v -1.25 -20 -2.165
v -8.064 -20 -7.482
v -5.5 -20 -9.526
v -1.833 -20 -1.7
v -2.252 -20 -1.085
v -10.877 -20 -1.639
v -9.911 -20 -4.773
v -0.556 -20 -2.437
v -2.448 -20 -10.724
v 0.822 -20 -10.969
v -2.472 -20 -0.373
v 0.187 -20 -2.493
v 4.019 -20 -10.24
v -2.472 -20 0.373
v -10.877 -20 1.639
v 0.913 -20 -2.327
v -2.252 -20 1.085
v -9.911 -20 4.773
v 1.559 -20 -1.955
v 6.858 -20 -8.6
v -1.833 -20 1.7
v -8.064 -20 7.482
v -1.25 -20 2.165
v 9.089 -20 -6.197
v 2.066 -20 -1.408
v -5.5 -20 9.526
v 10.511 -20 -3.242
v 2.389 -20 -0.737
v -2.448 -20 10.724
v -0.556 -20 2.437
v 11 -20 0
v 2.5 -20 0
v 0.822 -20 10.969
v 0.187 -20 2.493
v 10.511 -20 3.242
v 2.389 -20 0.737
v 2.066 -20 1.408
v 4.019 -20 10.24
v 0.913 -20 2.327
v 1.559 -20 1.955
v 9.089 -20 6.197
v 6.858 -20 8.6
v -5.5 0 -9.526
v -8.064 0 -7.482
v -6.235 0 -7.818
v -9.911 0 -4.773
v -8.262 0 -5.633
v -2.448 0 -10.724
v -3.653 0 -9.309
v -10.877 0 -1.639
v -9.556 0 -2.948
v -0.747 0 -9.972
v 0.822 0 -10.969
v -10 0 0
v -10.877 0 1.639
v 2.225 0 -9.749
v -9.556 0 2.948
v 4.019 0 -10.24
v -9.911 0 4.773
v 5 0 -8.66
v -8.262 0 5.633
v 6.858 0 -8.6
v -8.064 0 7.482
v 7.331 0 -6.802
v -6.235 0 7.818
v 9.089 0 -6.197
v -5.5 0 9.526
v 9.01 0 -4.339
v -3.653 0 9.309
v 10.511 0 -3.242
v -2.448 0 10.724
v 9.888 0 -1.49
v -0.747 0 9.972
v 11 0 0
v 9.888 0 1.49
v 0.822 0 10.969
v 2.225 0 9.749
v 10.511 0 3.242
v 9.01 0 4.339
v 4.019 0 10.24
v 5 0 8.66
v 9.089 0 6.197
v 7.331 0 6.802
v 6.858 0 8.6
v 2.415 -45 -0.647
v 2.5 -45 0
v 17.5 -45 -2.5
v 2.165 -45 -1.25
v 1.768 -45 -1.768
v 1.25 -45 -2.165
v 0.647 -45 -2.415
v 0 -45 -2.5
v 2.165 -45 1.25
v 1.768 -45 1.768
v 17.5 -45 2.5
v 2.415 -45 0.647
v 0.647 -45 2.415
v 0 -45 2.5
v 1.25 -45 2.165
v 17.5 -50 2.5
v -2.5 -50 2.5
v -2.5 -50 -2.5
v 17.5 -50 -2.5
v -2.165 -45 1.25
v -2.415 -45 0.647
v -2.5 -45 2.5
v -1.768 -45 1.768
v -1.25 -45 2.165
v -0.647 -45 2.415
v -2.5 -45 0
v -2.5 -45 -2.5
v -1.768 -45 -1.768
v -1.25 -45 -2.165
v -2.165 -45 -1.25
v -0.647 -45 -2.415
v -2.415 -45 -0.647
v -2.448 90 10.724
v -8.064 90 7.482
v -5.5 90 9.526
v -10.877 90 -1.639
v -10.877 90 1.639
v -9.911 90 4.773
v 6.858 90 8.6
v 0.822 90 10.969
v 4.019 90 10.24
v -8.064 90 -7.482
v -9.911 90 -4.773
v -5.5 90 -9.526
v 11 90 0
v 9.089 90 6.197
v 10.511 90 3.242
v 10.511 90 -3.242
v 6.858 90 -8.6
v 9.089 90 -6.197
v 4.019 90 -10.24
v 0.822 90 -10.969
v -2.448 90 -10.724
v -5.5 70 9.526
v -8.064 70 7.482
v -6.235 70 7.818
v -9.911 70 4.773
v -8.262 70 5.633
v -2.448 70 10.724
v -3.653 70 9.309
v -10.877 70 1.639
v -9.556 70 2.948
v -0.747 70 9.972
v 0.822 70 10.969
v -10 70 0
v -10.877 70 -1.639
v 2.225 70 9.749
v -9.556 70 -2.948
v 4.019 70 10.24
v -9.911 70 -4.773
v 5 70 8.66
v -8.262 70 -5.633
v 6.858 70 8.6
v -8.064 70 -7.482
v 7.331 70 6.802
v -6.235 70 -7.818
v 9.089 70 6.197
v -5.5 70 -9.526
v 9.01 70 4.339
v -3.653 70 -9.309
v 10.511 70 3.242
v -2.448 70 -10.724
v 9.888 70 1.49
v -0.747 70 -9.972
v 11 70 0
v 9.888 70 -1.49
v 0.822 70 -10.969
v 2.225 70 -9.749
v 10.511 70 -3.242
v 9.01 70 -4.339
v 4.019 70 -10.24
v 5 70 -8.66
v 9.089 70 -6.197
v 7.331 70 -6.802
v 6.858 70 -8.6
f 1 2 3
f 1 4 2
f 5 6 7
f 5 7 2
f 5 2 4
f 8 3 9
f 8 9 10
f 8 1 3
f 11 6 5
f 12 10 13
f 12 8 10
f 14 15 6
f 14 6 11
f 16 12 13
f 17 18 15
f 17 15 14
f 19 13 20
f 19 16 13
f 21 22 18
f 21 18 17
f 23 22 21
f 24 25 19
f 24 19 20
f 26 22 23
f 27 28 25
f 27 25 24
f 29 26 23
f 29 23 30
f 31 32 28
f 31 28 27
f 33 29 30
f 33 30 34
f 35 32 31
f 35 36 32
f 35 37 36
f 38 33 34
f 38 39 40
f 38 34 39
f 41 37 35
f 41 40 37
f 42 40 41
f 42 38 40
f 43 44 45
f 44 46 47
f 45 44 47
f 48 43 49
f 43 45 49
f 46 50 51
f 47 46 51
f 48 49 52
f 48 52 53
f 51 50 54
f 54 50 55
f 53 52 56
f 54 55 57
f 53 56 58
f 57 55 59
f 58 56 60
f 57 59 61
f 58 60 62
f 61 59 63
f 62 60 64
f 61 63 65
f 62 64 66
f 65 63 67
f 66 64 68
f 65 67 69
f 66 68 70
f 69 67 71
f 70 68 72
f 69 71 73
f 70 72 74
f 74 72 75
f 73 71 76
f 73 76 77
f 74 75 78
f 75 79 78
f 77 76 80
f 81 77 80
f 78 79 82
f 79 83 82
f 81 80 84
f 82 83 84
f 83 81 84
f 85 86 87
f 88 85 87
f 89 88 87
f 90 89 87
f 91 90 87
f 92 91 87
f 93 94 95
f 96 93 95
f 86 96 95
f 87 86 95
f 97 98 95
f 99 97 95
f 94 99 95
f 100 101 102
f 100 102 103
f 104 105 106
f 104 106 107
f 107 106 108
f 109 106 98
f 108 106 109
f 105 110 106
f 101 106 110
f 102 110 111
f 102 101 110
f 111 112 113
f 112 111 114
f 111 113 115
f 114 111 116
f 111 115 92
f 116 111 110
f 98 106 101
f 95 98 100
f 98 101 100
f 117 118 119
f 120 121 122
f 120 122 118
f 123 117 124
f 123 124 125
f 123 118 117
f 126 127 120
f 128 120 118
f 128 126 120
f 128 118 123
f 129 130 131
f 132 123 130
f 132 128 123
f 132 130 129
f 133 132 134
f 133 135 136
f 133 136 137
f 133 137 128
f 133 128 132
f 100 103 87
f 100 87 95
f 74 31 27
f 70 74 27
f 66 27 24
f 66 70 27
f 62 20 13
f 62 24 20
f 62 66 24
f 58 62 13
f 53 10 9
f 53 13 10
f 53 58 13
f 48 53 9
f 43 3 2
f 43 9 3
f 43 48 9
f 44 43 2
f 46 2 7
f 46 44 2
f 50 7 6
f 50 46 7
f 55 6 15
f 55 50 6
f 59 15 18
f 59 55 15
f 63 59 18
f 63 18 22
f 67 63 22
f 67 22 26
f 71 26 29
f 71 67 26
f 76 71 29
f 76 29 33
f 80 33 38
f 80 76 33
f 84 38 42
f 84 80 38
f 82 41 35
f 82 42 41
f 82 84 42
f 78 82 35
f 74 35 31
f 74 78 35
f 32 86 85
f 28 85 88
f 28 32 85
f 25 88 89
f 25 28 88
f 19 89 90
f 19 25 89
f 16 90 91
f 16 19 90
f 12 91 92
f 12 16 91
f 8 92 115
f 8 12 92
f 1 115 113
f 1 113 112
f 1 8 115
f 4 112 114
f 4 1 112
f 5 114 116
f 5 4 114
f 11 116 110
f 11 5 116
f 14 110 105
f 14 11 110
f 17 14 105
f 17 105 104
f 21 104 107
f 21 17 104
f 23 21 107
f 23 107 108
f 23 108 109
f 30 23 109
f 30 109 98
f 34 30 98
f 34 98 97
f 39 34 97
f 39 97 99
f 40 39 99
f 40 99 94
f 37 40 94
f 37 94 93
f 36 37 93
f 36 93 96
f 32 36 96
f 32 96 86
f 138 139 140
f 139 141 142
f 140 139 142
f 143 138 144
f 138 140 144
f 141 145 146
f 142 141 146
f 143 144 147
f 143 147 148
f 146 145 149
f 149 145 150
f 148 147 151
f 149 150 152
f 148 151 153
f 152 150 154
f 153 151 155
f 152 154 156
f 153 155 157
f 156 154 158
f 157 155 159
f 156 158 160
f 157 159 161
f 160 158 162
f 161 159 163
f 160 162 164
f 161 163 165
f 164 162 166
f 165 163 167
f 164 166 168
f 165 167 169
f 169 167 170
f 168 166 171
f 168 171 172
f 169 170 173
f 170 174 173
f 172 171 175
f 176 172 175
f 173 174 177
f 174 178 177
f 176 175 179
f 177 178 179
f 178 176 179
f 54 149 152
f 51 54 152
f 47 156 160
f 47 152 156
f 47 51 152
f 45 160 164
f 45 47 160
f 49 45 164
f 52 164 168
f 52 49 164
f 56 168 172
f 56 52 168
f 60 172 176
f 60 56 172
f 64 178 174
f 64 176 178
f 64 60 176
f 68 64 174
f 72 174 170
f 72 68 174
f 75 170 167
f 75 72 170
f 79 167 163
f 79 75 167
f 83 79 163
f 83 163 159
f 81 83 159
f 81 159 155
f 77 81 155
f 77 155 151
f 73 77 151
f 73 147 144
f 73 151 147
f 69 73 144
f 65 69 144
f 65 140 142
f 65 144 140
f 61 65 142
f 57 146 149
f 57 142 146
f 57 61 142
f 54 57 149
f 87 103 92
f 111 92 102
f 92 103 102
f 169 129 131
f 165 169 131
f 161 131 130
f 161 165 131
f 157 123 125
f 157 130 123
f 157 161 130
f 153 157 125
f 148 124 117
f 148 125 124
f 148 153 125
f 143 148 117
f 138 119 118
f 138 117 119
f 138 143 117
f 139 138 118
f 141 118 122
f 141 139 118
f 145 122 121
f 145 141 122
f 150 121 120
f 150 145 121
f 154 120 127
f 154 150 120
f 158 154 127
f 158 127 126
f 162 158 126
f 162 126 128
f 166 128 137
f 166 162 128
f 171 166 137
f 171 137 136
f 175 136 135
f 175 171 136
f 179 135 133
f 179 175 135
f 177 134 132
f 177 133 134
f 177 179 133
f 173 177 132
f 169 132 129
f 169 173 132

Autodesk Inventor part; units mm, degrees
ref_plane "YZ Plane" through (0, 0, 0) normal (1, 0, 0) x (0, 1, 0)
ref_plane "XZ Plane" through (0, 0, 0) normal (0, 1, 0) x (-1, 0, 0)
ref_plane "XY Plane" through (0, 0, 0) normal (0, 0, 1) x (1, 0, 0)
sketch "Эскиз1" plane through (0, 0, 0) normal (0, 1, 0) x (-1, 0, 0)
  circle A0 centre (0, 0) radius 10
  dimension "d0" = 20
extrude "Выдавливание1" add sketch "Эскиз1" along normal blind 70
thread "Резьба2" size "M20x1.5" class "6g" standard "ANSI Metric M Profile" full length
sketch "Эскиз2" plane through (0, 70, 0) normal (0, 1, 0) x (1, 0, 0)
  point P0 (0, 0)
sketch "Эскиз3" plane through (0, 70, 0) normal (0, 1, 0) x (1, 0, 0)
  circle A0 centre (0, 0) radius 11
  dimension "d7" = 22
extrude "Выдавливание2" add sketch "Эскиз3" along normal blind 20
sketch "Эскиз6" plane through (0, 0, 0) normal (0, -1, 0) x (1, 0, 0)
  circle A0 centre (0, 0) radius 11
extrude "Выдавливание5" add sketch "Эскиз6" along normal blind 20
sketch "Эскиз7" plane through (0, -20, 0) normal (0, -1, 0) x (1, 0, 0)
  circle A0 centre (0, 0) radius 2.5
  dimension "d18" = 5
extrude "Выдавливание6" add sketch "Эскиз7" along normal blind 30
sketch "Эскиз8" plane through (0, -50, 0) normal (0, -1, 0) x (1, 0, 0)
  line L0 (-2.5, 2.5) -> (-2.5, 0) projected
  line L1 (17.5, -2.5) -> (17.5, 2.5) projected
  line L2 (-2.5, 2.5) -> (17.5, 2.5)
  line L3 (17.5, 2.5) -> (17.5, -2.5)
  line L4 (17.5, -2.5) -> (-2.5, -2.5)
  line L5 (-2.5, -2.5) -> (-2.5, 2.5)
  point P0 (0, 0)
extrude "Выдавливание7" add sketch "Эскиз8" against normal blind 5
properties part number "Вал штурвала"
